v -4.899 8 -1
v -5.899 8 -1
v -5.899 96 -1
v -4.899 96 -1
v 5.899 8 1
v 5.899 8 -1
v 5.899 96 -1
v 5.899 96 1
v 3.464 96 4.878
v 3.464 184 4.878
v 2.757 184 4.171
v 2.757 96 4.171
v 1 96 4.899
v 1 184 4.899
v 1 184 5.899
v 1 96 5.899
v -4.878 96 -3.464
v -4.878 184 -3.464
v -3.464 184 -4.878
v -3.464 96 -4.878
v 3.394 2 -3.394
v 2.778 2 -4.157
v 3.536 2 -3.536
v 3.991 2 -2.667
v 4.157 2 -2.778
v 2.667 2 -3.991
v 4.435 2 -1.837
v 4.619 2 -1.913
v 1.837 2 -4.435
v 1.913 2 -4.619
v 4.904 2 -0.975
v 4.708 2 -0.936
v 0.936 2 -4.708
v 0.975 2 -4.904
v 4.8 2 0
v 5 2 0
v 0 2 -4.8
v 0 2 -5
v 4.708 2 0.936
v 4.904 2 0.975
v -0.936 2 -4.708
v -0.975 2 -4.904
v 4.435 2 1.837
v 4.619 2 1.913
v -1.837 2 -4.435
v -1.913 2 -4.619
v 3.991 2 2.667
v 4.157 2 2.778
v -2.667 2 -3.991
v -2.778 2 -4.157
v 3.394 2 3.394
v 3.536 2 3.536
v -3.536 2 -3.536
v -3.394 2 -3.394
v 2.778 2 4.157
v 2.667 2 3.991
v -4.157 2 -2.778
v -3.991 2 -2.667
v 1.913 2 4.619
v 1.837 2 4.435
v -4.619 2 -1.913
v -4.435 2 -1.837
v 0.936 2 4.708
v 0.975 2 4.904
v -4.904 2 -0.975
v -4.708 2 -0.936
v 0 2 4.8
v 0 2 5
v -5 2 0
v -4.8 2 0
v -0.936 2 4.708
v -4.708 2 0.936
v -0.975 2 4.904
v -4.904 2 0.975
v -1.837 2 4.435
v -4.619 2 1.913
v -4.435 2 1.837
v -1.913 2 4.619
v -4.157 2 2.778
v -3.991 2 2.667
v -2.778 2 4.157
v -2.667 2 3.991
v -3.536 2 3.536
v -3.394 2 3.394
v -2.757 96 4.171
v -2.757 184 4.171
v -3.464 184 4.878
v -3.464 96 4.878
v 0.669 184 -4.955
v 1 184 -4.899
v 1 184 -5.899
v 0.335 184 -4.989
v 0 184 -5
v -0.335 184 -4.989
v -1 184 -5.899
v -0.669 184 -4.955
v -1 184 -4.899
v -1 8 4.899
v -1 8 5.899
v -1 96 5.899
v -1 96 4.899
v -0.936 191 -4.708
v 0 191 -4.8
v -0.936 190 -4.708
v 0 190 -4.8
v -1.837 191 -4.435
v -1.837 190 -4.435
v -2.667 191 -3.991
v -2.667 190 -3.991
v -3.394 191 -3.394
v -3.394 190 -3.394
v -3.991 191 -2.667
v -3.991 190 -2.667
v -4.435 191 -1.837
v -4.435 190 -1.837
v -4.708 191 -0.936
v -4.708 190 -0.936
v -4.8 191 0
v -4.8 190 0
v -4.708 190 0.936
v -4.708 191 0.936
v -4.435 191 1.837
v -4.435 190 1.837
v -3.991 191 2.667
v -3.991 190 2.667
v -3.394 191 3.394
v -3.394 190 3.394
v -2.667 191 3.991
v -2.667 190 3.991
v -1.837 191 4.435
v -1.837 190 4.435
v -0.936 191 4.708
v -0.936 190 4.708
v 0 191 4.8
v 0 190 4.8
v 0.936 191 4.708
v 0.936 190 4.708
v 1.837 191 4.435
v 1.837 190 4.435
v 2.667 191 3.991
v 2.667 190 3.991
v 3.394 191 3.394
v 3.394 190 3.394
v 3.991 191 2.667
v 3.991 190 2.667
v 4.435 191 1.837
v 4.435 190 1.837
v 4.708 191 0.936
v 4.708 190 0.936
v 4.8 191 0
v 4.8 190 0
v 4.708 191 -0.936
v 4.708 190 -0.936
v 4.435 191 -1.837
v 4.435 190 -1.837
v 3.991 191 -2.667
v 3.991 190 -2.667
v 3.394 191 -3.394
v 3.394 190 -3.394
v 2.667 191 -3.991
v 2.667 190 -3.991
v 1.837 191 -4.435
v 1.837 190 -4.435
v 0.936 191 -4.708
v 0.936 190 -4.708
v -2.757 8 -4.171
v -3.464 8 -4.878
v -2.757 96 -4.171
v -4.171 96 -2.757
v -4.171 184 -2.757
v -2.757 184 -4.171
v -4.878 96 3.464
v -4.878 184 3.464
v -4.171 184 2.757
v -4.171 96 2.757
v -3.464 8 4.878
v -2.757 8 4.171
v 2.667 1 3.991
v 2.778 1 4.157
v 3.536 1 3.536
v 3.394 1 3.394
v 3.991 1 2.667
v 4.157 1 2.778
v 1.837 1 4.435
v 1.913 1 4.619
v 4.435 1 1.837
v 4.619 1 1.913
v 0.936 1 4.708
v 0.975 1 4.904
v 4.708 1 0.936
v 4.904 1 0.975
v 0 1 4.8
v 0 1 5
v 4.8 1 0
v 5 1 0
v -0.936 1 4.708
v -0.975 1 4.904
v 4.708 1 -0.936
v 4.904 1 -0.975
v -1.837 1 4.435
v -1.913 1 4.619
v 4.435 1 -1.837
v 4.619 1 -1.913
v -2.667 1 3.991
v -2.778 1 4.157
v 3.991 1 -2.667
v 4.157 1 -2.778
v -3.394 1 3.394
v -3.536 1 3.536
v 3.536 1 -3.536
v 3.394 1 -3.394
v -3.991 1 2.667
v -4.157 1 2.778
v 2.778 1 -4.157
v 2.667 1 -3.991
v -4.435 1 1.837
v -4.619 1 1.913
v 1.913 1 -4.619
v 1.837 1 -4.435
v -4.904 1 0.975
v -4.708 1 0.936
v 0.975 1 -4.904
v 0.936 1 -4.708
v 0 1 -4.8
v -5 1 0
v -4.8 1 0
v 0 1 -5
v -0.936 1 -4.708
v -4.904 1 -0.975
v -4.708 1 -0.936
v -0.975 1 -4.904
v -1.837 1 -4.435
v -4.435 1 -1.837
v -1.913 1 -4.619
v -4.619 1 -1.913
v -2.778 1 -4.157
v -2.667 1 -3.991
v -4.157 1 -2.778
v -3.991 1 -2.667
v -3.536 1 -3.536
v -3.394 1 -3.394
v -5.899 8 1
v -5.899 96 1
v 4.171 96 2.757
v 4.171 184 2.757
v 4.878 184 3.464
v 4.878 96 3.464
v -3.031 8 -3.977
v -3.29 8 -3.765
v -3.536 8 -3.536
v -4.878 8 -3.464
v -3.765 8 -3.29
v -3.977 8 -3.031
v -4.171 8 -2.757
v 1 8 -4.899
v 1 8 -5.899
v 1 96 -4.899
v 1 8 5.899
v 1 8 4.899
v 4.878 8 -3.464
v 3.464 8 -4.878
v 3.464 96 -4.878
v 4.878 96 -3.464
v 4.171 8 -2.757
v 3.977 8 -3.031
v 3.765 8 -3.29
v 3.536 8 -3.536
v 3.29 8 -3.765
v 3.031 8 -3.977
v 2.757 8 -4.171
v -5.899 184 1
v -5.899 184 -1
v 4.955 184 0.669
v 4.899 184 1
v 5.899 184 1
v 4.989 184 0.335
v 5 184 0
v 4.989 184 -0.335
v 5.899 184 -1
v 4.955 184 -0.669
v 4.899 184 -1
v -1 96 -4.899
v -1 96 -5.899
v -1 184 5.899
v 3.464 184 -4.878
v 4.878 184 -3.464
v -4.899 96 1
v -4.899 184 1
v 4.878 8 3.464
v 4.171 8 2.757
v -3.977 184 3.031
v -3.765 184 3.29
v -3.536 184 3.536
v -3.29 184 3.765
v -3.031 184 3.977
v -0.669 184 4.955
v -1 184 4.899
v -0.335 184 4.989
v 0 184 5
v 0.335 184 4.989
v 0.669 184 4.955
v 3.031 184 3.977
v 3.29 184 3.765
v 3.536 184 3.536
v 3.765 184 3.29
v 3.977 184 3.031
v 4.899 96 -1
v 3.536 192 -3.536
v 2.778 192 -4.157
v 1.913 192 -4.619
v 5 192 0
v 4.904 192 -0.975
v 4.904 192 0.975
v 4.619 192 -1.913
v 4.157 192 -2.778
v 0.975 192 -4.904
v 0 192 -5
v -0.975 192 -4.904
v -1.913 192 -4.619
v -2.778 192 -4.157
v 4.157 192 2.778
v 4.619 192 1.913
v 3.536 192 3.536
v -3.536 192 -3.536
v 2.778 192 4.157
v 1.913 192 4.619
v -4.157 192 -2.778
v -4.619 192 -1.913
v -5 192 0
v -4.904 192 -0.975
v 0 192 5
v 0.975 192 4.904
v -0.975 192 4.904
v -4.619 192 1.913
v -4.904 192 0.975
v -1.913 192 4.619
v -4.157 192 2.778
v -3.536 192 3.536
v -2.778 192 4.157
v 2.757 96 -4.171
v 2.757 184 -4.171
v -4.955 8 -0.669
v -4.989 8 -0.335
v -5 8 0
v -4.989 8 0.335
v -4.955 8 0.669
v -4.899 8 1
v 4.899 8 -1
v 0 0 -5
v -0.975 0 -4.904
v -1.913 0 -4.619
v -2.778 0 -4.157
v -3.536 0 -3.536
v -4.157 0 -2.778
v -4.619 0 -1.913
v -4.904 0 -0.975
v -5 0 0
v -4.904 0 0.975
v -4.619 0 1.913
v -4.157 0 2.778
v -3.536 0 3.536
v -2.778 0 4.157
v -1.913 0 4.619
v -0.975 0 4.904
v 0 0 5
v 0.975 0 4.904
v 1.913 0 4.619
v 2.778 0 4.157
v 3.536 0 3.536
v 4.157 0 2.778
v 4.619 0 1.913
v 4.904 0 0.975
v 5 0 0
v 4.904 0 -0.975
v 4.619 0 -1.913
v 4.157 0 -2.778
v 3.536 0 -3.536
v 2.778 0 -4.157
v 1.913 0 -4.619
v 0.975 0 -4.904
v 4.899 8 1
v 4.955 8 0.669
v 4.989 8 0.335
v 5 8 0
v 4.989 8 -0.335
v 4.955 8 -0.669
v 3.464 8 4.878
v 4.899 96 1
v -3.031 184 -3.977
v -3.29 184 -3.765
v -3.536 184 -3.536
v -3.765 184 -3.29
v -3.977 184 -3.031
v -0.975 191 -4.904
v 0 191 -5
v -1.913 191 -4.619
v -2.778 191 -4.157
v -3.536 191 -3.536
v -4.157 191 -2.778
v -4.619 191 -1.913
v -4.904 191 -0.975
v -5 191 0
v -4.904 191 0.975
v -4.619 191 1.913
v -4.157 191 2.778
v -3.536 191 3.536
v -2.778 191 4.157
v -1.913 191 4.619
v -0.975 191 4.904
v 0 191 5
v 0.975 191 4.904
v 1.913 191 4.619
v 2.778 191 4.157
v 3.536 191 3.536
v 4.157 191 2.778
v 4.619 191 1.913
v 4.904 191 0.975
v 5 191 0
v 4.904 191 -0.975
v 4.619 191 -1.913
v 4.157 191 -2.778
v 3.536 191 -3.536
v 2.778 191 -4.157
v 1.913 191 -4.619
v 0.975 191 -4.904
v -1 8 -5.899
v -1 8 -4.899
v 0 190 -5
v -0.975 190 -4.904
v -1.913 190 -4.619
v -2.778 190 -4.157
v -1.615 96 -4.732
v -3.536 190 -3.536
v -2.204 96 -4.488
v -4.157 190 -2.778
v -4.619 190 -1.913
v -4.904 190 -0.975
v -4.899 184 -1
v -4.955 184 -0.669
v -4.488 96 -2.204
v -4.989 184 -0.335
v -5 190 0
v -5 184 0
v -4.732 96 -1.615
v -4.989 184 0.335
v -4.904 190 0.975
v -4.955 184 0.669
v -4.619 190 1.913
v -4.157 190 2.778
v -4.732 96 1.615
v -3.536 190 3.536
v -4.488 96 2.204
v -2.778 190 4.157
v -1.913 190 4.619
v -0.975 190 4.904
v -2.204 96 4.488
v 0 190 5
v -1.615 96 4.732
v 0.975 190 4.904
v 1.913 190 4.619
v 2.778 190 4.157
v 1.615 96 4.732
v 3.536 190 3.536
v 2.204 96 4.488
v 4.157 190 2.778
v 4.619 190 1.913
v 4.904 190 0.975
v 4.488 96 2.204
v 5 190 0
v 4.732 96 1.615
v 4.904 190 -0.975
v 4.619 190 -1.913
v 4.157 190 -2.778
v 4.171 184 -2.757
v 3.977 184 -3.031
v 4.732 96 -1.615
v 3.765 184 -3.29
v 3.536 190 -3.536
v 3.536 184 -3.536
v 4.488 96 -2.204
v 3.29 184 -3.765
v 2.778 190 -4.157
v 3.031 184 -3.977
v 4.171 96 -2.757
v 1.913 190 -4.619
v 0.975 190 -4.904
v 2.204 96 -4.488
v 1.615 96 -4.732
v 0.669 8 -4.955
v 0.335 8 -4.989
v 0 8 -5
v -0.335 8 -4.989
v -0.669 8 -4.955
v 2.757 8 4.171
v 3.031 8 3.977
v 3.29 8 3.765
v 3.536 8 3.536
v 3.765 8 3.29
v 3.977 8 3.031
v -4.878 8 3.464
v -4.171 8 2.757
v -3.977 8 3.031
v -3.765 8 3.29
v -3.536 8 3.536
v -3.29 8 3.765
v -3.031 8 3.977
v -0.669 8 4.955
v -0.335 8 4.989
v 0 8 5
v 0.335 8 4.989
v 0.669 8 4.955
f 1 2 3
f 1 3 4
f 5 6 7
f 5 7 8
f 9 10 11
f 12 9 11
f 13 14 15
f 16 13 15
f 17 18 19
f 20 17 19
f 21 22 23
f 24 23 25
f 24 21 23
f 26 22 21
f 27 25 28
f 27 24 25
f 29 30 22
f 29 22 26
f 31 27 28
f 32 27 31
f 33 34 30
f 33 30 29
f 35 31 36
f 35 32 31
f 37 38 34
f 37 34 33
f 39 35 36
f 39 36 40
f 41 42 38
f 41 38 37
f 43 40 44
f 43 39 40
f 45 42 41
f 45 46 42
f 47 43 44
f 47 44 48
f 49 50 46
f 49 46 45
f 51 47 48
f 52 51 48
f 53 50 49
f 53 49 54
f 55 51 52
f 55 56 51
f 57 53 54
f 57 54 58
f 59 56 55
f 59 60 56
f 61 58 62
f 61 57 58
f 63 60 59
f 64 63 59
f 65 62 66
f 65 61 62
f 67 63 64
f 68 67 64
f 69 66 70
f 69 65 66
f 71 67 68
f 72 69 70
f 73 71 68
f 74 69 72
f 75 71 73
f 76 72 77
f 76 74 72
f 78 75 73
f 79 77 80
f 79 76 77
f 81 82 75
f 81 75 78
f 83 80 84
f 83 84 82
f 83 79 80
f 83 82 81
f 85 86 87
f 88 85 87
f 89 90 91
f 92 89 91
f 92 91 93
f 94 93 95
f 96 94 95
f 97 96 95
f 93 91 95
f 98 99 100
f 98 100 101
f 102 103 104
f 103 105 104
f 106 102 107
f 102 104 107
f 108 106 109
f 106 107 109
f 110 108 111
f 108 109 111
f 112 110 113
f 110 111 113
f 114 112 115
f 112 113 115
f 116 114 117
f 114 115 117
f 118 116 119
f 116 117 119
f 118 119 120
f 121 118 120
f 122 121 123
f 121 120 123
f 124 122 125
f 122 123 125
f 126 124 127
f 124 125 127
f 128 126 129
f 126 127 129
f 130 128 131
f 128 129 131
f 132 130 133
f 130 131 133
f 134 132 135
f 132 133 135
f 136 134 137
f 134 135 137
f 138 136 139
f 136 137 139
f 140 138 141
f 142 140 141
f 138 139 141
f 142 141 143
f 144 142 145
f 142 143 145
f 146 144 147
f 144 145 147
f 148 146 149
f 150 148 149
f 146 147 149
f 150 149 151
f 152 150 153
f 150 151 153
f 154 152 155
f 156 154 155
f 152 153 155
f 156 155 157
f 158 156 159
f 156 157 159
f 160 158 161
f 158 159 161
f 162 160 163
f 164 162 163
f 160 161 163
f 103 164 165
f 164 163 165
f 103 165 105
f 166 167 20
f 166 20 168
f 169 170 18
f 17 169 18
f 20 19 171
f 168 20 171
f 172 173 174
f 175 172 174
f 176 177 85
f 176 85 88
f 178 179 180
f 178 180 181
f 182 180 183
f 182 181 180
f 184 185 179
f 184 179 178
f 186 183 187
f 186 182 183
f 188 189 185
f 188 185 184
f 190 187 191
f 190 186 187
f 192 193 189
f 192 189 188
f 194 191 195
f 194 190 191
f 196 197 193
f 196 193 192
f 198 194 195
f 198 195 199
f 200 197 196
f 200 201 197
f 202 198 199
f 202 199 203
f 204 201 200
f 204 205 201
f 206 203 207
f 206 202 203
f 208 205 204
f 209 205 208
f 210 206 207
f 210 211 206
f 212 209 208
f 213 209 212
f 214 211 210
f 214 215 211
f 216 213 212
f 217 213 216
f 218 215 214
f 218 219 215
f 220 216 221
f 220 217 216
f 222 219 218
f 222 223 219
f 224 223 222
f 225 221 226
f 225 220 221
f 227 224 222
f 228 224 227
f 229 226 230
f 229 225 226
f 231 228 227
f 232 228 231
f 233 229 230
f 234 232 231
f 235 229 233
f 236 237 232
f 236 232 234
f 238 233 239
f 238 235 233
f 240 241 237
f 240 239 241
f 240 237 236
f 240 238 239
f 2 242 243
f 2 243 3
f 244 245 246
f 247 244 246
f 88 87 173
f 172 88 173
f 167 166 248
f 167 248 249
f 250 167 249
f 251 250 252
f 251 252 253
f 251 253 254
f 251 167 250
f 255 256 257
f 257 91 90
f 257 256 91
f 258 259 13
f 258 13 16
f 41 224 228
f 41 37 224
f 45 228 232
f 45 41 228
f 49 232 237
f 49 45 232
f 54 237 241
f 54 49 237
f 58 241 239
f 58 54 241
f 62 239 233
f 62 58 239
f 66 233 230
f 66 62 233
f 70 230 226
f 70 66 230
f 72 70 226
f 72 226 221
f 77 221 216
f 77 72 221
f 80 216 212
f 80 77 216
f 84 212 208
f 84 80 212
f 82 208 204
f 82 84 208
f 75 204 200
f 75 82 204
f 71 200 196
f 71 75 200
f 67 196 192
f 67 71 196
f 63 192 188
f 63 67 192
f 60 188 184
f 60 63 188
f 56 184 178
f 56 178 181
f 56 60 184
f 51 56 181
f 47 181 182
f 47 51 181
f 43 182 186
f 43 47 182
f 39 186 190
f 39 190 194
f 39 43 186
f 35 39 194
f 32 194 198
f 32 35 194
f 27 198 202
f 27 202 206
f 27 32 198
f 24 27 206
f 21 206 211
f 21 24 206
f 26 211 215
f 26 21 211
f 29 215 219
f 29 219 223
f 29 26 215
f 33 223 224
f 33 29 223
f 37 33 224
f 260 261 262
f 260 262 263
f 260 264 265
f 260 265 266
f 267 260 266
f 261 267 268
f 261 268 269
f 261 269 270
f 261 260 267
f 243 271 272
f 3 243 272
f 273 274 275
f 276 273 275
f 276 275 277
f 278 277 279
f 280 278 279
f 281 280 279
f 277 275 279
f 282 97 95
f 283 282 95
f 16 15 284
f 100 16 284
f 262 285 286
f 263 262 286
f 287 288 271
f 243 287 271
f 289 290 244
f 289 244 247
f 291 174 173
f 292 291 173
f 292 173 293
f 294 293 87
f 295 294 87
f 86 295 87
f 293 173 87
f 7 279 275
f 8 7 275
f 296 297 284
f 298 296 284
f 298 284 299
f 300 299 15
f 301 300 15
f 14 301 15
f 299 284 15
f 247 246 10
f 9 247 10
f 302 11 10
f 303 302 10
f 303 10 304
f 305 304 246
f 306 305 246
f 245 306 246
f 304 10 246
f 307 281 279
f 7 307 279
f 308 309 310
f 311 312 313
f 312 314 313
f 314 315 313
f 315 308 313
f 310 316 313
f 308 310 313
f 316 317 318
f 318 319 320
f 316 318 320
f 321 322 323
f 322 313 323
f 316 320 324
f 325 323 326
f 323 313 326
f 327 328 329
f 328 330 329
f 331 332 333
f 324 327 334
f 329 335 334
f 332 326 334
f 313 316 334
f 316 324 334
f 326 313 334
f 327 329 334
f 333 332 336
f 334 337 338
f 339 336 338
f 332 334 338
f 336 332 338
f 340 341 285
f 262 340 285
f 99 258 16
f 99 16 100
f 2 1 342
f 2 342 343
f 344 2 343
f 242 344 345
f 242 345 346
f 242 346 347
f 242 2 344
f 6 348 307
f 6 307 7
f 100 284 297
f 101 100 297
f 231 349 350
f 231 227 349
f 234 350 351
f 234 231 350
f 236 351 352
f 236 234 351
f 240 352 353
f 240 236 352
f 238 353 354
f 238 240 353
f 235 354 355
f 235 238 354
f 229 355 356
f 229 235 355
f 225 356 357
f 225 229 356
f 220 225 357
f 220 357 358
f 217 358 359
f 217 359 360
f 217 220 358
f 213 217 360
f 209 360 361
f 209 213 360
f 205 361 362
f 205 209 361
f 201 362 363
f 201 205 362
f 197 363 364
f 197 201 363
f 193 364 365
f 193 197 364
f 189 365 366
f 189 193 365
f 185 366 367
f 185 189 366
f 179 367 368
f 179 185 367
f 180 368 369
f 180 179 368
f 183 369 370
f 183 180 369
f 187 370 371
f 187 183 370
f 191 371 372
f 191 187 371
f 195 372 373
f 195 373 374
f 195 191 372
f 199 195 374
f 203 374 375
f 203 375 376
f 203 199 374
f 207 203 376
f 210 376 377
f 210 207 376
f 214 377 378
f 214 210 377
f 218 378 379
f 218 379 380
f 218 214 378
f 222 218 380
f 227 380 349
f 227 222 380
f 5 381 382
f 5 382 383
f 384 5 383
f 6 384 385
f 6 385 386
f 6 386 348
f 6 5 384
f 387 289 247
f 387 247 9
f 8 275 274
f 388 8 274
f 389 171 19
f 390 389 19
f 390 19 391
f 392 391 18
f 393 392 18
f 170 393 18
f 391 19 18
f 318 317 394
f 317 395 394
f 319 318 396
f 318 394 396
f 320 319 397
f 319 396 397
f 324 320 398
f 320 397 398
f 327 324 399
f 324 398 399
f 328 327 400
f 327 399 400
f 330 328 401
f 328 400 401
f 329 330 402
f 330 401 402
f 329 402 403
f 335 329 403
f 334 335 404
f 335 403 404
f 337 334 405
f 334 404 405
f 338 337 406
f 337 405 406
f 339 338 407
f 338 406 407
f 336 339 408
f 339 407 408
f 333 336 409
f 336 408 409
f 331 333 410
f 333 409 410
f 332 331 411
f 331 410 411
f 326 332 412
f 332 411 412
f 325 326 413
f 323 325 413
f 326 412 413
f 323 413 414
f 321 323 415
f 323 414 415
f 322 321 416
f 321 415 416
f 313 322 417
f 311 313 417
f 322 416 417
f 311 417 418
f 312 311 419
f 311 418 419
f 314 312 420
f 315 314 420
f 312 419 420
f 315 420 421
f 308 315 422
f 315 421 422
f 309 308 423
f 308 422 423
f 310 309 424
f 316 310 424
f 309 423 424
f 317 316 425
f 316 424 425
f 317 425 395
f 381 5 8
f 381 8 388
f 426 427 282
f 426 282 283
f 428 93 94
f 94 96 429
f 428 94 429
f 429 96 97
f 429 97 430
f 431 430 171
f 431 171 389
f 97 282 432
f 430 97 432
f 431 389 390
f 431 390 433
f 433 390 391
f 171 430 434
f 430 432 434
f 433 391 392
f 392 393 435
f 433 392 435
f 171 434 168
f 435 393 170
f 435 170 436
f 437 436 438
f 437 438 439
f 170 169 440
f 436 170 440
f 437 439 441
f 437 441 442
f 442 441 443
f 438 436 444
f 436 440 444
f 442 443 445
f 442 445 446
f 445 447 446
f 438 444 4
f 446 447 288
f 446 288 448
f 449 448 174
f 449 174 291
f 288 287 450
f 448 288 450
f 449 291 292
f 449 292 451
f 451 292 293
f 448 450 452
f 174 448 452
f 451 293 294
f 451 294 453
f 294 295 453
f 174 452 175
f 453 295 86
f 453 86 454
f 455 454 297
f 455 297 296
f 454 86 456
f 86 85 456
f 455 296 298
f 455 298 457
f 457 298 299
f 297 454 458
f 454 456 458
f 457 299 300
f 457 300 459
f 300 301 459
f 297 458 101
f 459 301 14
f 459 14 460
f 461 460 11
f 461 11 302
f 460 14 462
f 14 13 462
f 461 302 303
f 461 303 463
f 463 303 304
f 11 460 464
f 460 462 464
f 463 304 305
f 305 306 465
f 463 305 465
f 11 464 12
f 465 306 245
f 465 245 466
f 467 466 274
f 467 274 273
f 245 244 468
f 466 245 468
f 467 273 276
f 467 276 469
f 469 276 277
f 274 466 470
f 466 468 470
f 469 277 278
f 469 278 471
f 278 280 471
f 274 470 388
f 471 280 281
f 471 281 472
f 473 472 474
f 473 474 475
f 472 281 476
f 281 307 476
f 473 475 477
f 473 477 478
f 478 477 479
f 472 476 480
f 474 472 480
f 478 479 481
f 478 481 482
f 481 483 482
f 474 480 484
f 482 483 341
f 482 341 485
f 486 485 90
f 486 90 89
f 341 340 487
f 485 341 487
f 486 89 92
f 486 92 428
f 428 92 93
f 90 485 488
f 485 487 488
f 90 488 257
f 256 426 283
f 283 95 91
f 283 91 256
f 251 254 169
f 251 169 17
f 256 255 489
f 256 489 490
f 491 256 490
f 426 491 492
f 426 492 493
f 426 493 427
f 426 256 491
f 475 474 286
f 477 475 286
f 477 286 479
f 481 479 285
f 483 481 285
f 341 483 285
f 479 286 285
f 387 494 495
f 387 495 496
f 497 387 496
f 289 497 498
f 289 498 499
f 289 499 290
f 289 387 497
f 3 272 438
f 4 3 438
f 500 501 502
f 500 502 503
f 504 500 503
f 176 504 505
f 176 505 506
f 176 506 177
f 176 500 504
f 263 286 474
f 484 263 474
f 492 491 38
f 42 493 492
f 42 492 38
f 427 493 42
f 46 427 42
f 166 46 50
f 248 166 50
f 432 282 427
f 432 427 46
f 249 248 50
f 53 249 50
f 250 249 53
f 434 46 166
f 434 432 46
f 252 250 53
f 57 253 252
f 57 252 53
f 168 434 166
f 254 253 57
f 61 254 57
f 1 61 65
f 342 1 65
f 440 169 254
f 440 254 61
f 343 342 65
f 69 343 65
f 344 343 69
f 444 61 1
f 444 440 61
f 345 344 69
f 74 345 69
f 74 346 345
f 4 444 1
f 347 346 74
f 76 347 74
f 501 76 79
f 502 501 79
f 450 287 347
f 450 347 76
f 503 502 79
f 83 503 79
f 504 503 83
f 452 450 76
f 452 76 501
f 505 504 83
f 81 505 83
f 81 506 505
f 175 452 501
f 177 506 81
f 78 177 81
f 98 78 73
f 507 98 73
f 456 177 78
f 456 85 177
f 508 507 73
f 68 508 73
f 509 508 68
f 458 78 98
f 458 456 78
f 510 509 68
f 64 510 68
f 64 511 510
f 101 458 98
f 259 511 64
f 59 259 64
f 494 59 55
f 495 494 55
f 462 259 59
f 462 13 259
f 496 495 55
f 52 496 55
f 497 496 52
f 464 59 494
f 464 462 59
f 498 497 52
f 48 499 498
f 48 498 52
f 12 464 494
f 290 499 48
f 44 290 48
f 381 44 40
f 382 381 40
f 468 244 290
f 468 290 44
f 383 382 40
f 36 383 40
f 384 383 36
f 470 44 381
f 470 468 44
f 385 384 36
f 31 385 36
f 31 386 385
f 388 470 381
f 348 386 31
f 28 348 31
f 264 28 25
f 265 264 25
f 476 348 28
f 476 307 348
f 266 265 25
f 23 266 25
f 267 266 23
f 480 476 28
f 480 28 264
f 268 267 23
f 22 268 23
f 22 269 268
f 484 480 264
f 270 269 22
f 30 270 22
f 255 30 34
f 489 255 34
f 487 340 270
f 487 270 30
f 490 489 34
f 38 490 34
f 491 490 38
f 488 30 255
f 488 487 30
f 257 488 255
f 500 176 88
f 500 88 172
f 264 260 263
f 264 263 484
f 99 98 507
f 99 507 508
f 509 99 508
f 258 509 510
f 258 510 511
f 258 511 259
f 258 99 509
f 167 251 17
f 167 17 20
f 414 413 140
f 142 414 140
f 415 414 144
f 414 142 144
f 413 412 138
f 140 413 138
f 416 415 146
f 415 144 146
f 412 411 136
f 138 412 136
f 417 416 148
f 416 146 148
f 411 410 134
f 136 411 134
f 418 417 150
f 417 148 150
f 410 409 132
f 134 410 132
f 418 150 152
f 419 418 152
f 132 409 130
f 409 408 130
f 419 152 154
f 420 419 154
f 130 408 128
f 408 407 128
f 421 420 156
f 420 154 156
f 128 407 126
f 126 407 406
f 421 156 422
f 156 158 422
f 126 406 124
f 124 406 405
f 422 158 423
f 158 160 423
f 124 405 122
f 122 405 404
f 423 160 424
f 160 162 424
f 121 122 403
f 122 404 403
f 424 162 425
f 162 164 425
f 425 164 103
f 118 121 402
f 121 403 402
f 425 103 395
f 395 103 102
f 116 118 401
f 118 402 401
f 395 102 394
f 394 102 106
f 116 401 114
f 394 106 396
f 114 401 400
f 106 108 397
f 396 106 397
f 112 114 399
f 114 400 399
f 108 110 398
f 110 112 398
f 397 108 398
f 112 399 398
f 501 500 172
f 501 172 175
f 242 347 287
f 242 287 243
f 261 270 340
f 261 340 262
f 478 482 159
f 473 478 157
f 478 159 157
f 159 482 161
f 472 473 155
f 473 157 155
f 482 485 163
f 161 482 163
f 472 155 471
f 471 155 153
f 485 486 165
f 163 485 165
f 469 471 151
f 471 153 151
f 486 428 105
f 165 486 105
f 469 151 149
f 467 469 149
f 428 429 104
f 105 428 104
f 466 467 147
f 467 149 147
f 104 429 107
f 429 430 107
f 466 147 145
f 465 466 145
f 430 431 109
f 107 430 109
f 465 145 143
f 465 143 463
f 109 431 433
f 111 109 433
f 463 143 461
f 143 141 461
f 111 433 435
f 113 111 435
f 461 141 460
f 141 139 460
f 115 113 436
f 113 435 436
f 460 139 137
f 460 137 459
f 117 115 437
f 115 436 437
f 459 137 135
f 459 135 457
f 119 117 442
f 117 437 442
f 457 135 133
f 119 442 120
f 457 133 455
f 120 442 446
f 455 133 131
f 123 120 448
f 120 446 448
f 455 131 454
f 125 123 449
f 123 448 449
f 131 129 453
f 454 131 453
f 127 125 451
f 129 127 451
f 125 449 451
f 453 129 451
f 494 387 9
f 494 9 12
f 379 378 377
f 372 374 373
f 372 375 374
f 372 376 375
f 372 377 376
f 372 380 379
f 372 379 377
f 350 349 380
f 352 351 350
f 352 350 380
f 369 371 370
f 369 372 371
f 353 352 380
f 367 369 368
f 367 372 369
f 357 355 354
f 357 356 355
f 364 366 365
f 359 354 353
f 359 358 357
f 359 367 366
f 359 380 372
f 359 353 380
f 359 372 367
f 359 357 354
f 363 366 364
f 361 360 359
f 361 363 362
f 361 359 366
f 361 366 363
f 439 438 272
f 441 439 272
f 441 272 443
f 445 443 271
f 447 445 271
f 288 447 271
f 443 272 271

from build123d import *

# Parameters (mm, degrees)
BOSS_EXTRUDE2_START = -8
BOSS_EXTRUDE2_DEPTH = 88
CIRPATTERN1_COUNT   = 8


with BuildPart() as part:
    # Sketch3 → Revolve1 (revolve)
    with BuildSketch(Plane(origin=(0, 0, 0), x_dir=(0, 0, -1), z_dir=(1, 0, 0))):
        Polygon((5, 96), (0, 96), (0, 0), (5, 0), (5, 1), (4.8, 1), (4.8, 2), (5, 2), align=None)
    revolve(axis=Axis((0, 0, 0), (0, 1, 0)))

    # Sketch4 → Boss-Extrude2 (add, through all)
    with BuildSketch(Plane.XZ.offset(BOSS_EXTRUDE2_START)):
        with BuildLine():
            Line((-1, 5.898979486), (-1, 4.898979486))
            ThreePointArc((-1, 4.898979486), (-0.50254481, 4.974680765), (0, 5))
            Line((0, 5), (0, 5.898979486))
            Line((0, 5.898979486), (-1, 5.898979486))
        make_face()
        with BuildLine():
            Line((0, 5.898979486), (0, 5))
            ThreePointArc((0, 5), (0.50254481, 4.974680765), (1, 4.898979486))
            Line((1, 4.898979486), (1, 5.898979486))
            Line((1, 5.898979486), (0, 5.898979486))
        make_face()
    boss_extrude2 = extrude(amount=-BOSS_EXTRUDE2_DEPTH)

    # CirPattern1: Boss-Extrude2 ×8 about axis
    cirpattern1_axis = Axis((0, 0, 0), (0, 1, 0))
    for i in range(1, CIRPATTERN1_COUNT):
        add(boss_extrude2.rotate(cirpattern1_axis, i * 360 / CIRPATTERN1_COUNT))

    # Mirror1: part across plane


with BuildPart() as part_1:
    add(part.part)
    add(part.part.mirror(Plane(origin=(0, 96, 0), x_dir=(0, 0, 1), z_dir=(0, -1, 0))))


solid = part_1.part
